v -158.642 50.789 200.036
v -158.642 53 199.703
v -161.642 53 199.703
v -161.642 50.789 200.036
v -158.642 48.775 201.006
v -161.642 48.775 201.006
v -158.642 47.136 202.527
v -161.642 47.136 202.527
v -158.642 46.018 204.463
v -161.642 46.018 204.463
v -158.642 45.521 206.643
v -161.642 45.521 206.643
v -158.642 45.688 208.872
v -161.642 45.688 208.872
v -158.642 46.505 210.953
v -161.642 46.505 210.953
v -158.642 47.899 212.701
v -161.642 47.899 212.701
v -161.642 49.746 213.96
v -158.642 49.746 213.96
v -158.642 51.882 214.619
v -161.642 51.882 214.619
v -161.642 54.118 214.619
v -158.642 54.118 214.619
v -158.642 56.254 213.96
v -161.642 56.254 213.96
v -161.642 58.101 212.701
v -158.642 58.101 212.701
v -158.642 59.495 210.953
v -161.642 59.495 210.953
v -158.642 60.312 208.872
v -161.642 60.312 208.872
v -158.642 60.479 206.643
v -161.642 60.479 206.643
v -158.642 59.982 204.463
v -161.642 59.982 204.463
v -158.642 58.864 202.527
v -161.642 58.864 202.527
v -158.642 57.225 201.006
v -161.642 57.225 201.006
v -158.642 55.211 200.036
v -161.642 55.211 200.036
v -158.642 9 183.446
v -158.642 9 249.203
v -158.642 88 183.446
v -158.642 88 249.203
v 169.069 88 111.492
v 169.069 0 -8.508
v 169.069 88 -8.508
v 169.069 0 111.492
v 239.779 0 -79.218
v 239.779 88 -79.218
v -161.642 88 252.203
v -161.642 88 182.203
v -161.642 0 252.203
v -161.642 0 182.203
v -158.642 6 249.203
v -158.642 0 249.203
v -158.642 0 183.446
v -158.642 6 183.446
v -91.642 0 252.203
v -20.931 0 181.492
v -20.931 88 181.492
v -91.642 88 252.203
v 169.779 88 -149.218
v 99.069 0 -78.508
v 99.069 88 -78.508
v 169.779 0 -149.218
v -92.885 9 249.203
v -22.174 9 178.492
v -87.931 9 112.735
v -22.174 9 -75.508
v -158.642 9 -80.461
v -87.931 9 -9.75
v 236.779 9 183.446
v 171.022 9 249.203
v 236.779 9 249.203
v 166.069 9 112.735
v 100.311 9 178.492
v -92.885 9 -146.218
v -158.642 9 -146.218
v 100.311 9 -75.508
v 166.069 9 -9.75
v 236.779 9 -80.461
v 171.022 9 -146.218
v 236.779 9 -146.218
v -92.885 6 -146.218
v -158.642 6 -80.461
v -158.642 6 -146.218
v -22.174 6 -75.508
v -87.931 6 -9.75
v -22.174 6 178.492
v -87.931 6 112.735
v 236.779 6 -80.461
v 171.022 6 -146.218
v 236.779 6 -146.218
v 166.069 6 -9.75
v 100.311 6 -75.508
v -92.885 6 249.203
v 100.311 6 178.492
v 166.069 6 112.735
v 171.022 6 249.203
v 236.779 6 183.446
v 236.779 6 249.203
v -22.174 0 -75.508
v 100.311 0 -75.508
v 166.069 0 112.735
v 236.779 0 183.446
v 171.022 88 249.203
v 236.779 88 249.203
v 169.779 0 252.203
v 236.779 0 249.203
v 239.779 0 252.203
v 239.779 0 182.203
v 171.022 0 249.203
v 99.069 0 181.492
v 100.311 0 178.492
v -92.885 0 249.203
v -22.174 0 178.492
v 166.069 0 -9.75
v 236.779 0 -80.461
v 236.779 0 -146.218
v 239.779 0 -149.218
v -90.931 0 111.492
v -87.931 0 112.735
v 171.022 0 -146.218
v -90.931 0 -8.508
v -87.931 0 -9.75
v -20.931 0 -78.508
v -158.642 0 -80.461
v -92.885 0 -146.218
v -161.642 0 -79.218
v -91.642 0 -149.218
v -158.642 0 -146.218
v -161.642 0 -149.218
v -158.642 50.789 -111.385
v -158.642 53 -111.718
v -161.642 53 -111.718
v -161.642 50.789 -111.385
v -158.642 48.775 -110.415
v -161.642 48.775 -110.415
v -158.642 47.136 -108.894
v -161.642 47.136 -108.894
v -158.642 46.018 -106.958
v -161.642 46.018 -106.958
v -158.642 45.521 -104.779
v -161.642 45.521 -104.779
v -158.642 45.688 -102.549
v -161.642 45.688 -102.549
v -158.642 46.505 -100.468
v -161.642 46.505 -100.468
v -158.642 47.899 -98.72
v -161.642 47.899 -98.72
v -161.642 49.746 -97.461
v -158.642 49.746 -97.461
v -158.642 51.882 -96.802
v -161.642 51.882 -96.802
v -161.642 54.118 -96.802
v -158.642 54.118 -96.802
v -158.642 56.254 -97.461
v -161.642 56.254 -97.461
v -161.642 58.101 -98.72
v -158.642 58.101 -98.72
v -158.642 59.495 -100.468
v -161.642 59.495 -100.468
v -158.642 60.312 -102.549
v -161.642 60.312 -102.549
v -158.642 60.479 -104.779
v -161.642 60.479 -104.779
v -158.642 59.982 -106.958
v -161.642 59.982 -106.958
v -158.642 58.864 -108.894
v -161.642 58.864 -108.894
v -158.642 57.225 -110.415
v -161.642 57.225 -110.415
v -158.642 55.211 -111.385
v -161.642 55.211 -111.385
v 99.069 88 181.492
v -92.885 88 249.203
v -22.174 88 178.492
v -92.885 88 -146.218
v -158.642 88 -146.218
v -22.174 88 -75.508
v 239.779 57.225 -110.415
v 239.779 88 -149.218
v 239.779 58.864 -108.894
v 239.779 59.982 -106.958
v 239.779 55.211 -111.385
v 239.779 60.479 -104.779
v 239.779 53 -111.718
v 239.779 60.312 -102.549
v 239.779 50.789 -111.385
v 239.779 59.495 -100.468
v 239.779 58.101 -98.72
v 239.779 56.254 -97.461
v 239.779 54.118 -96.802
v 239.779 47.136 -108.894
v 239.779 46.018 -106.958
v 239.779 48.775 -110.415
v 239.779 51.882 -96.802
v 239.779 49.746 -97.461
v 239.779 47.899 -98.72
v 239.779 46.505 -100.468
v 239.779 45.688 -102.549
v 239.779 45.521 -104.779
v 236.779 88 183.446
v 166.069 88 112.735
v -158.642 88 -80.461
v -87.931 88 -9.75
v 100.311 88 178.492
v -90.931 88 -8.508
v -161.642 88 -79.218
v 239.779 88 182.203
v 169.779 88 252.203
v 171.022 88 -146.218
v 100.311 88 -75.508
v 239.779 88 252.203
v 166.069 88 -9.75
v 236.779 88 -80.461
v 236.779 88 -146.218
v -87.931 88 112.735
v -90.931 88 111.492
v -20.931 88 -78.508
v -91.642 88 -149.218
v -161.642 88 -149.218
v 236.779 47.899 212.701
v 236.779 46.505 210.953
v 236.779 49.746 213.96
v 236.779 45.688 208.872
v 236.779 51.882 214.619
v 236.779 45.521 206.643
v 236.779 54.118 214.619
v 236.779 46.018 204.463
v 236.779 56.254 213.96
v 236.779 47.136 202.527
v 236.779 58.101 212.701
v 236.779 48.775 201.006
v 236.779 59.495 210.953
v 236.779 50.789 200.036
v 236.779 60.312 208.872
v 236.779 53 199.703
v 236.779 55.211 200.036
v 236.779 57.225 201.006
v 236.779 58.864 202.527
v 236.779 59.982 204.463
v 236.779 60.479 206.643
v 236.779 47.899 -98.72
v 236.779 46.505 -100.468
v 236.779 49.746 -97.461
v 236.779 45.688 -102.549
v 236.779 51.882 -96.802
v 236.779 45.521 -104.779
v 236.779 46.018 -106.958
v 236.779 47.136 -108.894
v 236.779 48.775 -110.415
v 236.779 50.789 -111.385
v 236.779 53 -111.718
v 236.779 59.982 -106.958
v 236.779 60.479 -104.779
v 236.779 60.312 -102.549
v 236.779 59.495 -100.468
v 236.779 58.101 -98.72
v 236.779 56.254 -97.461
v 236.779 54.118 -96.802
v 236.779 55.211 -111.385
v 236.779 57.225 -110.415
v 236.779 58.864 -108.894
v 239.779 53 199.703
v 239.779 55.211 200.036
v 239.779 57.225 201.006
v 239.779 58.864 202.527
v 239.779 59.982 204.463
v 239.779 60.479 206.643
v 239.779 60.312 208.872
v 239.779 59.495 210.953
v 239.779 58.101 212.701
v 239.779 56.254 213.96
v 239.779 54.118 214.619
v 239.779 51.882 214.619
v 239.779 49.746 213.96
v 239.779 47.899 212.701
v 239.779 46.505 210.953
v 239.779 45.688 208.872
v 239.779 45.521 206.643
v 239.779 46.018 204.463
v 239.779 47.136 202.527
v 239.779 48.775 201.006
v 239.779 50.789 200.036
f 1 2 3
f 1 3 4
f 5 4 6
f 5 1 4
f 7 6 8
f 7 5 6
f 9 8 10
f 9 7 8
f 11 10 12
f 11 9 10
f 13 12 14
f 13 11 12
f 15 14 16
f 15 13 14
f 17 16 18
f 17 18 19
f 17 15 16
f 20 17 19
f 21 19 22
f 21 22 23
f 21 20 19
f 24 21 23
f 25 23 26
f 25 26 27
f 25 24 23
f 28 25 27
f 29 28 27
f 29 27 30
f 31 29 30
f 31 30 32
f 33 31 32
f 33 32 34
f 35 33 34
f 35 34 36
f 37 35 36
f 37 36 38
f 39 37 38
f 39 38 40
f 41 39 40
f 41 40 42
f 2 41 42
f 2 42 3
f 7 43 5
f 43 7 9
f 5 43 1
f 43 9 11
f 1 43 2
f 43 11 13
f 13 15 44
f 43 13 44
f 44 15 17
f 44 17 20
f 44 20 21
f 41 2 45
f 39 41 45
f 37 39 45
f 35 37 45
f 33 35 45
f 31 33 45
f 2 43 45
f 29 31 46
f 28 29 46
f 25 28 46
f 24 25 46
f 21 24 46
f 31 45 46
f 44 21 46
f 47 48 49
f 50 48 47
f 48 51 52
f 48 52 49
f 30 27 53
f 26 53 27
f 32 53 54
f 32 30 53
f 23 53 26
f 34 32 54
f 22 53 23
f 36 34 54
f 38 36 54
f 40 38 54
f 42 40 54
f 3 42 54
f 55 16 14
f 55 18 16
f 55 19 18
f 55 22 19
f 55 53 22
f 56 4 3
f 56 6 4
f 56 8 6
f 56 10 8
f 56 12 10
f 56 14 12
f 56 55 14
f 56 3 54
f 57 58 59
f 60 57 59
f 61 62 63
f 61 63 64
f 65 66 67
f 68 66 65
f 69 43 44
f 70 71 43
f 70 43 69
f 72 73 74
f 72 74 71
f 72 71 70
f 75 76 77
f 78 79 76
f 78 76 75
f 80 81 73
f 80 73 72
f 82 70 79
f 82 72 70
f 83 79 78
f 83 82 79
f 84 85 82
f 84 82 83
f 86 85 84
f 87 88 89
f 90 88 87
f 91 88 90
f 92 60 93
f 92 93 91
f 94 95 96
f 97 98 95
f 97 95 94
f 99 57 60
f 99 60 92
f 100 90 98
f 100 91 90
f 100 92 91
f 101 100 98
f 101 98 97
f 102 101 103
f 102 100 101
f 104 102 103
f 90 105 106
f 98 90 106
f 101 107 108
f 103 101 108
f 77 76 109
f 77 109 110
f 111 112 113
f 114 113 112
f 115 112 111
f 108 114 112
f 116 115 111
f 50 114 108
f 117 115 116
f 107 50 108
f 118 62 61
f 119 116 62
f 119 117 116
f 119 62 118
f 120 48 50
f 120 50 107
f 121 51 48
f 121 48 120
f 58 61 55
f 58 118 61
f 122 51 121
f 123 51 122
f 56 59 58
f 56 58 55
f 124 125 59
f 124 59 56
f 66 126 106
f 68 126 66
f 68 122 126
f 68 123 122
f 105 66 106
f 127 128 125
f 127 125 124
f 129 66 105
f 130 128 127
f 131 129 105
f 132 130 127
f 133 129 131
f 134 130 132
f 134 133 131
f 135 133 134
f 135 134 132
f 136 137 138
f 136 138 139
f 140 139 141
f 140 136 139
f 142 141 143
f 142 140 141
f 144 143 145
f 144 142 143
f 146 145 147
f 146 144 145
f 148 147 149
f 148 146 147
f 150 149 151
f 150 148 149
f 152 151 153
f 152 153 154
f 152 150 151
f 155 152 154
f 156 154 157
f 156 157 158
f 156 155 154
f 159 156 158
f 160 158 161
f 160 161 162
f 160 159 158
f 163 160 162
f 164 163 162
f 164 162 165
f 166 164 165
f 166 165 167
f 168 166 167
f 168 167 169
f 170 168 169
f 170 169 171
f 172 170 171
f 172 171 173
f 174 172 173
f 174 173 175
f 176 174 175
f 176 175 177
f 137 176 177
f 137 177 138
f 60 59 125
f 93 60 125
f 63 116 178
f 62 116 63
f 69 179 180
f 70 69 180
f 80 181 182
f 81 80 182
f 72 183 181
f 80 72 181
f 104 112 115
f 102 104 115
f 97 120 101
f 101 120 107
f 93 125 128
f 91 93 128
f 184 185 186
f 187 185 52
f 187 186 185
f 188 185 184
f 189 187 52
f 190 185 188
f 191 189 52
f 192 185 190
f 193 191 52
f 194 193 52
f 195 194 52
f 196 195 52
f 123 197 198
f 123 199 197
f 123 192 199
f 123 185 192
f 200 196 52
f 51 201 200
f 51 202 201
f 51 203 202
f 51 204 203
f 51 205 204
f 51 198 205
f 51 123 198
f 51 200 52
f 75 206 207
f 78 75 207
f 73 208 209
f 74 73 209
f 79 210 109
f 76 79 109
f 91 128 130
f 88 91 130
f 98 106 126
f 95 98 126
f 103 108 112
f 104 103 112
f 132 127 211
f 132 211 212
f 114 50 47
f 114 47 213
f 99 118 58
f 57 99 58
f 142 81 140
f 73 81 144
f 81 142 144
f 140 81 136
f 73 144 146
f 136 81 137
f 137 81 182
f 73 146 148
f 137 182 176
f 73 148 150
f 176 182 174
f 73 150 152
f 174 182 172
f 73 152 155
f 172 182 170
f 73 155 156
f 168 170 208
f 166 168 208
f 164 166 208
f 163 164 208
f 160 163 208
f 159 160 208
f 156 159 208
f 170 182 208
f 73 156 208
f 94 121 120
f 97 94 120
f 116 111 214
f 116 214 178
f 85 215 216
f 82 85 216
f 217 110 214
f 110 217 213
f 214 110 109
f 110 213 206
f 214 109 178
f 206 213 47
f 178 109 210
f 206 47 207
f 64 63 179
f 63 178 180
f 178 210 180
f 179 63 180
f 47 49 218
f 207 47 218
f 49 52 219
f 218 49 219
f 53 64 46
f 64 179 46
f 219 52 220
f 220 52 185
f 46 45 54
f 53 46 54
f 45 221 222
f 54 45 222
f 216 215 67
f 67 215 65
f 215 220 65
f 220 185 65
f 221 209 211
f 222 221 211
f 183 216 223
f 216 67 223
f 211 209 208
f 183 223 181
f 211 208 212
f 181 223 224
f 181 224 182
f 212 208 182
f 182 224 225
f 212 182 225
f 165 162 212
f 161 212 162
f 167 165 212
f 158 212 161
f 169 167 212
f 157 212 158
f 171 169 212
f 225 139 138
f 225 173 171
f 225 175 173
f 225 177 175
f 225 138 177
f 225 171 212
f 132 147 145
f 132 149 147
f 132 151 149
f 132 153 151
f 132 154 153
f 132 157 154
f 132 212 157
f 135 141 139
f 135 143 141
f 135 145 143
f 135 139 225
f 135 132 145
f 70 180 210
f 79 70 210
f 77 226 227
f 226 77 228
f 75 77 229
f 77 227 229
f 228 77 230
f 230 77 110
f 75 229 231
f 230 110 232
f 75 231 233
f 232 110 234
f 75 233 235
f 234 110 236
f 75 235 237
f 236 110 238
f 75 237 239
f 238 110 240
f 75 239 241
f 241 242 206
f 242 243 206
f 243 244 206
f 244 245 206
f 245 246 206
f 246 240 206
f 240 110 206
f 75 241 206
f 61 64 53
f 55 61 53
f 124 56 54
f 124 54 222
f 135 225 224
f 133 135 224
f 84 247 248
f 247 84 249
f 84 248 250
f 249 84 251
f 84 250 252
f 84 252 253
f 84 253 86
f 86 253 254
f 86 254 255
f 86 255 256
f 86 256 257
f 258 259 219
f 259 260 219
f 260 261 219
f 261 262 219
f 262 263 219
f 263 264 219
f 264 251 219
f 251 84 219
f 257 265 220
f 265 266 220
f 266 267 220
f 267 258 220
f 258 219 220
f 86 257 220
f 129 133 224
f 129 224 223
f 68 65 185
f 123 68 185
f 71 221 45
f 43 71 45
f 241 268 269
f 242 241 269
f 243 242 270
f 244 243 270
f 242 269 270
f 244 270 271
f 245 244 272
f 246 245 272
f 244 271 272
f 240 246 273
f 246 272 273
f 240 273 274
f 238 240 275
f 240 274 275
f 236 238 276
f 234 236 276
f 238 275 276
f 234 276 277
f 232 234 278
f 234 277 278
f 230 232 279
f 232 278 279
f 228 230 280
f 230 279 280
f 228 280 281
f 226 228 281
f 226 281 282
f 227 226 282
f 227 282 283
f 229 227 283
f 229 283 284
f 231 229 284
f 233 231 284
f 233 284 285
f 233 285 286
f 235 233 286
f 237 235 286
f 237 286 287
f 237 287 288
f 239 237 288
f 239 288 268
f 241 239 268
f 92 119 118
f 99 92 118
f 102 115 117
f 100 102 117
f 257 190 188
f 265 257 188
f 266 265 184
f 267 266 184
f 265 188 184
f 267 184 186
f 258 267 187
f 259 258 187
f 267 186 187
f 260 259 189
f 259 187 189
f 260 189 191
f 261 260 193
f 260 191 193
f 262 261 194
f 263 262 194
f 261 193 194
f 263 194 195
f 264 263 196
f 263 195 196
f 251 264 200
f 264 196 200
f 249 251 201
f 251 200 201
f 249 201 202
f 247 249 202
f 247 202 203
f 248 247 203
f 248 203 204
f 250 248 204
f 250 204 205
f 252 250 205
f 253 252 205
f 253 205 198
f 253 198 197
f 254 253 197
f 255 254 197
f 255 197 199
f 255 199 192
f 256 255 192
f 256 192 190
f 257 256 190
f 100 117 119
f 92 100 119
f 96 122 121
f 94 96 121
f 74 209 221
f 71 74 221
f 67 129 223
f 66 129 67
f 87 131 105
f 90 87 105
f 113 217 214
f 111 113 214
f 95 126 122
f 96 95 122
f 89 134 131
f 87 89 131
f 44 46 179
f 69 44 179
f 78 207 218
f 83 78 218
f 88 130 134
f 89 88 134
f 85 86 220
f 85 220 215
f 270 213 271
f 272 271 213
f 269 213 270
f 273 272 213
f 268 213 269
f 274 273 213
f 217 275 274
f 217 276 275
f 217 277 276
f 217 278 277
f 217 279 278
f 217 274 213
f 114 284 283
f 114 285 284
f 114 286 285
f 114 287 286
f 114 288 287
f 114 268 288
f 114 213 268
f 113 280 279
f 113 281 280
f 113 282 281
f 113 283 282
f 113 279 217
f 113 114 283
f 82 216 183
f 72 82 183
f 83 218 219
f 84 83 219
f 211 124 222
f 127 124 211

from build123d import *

# Parameters (mm, degrees)
BOSS_EXTRUDE1_DEPTH = 88
CUT_EXTRUDE1_DEPTH  = 79
SKETCH4_R           = 7.5
CUT_EXTRUDE2_DEPTH  = 47
SKETCH6_R           = 7.5
CUT_EXTRUDE4_DEPTH  = 47
CUT_EXTRUDE5_START  = -47
SKETCH7_R           = 7.5
CUT_EXTRUDE5_DEPTH  = 47
CUT_EXTRUDE6_START  = -47
SKETCH8_R           = 7.5
CUT_EXTRUDE6_DEPTH  = 47
CUT_EXTRUDE8_DEPTH  = 6


with BuildPart() as part:
    # Sketch1 → Boss-Extrude1 (new body)
    with BuildSketch(Plane(origin=(0, 0, 0), x_dir=(1, 0, 0), z_dir=(0, 1, 0))):
        Polygon((-161.642165003, 149.218305812), (-91.642165003, 149.218305812), (-20.931486885, 78.507627693), (99.068513115, 78.507627693), (169.779191234, 149.218305812), (239.779191234, 149.218305812), (239.779191234, 79.218305812), (169.068513115, 8.507627693), (169.068513115, -111.492372307), (239.779191234, -182.203050426), (239.779191234, -252.203050426), (169.779191234, -252.203050426), (99.068513115, -181.492372307), (-20.931486885, -181.492372307), (-91.642165003, -252.203050426), (-161.642165003, -252.203050426), (-161.642165003, -182.203050426), (-90.931486885, -111.492372307), (-90.931486885, 8.507627693), (-161.642165003, 79.218305812), align=None)
    extrude(amount=BOSS_EXTRUDE1_DEPTH)

    # Sketch3 → Cut-Extrude1 (cut)
    with BuildSketch(Plane(origin=(0, 88, 0), x_dir=(1, 0, 0), z_dir=(0, 1, 0))):
        Polygon((-158.642165003, 146.218305812), (-158.642165003, 80.460946499), (-87.931486885, 9.75026838), (-87.931486885, -112.735012994), (-158.642165003, -183.445691113), (-158.642165003, -249.203050426), (-92.88480569, -249.203050426), (-22.174127572, -178.492372307), (100.311153802, -178.492372307), (171.021831921, -249.203050426), (236.779191234, -249.203050426), (236.779191234, -183.445691113), (166.068513115, -112.735012994), (166.068513115, 9.75026838), (236.779191234, 80.460946499), (236.779191234, 146.218305812), (171.021831921, 146.218305812), (100.311153802, 75.507627693), (-22.174127572, 75.507627693), (-92.88480569, 146.218305812), align=None)
    extrude(amount=-CUT_EXTRUDE1_DEPTH, mode=Mode.SUBTRACT)

    # Sketch4 → Cut-Extrude2 (cut)
    with BuildSketch(Plane(origin=(239.779191234, 0, 0), x_dir=(0, 0, -1), z_dir=(1, 0, 0))):
        with Locations((-207.203050426, 53)):
            Circle(SKETCH4_R)
    extrude(amount=-CUT_EXTRUDE2_DEPTH, mode=Mode.SUBTRACT)

    # Sketch6 → Cut-Extrude4 (cut)
    with BuildSketch(Plane(origin=(239.779191234, 0, 0), x_dir=(0, 0, -1), z_dir=(1, 0, 0))):
        with Locations((104.218305812, 53)):
            Circle(SKETCH6_R)
    extrude(amount=-CUT_EXTRUDE4_DEPTH, mode=Mode.SUBTRACT)

    # Sketch7 → Cut-Extrude5 (cut)
    with BuildSketch(Plane.ZY.offset(161.642165003).offset(CUT_EXTRUDE5_START)):
        with Locations(Location((-104.218305812, 53, 0), (0, 0, 180))):
            Circle(SKETCH7_R)
    extrude(amount=CUT_EXTRUDE5_DEPTH, mode=Mode.SUBTRACT)

    # Sketch8 → Cut-Extrude6 (cut)
    with BuildSketch(Plane.ZY.offset(161.642165003).offset(CUT_EXTRUDE6_START)):
        with Locations(Location((207.203050426, 53, 0), (0, 0, 180))):
            Circle(SKETCH8_R)
    extrude(amount=CUT_EXTRUDE6_DEPTH, mode=Mode.SUBTRACT)

    # Sketch17 → Cut-Extrude8 (cut)
    with BuildSketch(Plane.XZ):
        Polygon((100.311153802, -75.507627693), (171.021831921, -146.218305812), (236.779191234, -146.218305812), (236.779191234, -80.460946499), (166.068513115, -9.75026838), (166.068513115, 112.735012994), (236.779191234, 183.445691113), (236.779191234, 249.203050426), (171.021831921, 249.203050426), (100.311153802, 178.492372307), (-22.174127572, 178.492372307), (-92.88480569, 249.203050426), (-158.642165003, 249.203050426), (-158.642165003, 183.445691113), (-87.931486885, 112.735012994), (-87.931486885, -9.75026838), (-158.642165003, -80.460946499), (-158.642165003, -146.218305812), (-92.88480569, -146.218305812), (-22.174127572, -75.507627693), align=None)
    extrude(amount=-CUT_EXTRUDE8_DEPTH, mode=Mode.SUBTRACT)


solid = part.part
